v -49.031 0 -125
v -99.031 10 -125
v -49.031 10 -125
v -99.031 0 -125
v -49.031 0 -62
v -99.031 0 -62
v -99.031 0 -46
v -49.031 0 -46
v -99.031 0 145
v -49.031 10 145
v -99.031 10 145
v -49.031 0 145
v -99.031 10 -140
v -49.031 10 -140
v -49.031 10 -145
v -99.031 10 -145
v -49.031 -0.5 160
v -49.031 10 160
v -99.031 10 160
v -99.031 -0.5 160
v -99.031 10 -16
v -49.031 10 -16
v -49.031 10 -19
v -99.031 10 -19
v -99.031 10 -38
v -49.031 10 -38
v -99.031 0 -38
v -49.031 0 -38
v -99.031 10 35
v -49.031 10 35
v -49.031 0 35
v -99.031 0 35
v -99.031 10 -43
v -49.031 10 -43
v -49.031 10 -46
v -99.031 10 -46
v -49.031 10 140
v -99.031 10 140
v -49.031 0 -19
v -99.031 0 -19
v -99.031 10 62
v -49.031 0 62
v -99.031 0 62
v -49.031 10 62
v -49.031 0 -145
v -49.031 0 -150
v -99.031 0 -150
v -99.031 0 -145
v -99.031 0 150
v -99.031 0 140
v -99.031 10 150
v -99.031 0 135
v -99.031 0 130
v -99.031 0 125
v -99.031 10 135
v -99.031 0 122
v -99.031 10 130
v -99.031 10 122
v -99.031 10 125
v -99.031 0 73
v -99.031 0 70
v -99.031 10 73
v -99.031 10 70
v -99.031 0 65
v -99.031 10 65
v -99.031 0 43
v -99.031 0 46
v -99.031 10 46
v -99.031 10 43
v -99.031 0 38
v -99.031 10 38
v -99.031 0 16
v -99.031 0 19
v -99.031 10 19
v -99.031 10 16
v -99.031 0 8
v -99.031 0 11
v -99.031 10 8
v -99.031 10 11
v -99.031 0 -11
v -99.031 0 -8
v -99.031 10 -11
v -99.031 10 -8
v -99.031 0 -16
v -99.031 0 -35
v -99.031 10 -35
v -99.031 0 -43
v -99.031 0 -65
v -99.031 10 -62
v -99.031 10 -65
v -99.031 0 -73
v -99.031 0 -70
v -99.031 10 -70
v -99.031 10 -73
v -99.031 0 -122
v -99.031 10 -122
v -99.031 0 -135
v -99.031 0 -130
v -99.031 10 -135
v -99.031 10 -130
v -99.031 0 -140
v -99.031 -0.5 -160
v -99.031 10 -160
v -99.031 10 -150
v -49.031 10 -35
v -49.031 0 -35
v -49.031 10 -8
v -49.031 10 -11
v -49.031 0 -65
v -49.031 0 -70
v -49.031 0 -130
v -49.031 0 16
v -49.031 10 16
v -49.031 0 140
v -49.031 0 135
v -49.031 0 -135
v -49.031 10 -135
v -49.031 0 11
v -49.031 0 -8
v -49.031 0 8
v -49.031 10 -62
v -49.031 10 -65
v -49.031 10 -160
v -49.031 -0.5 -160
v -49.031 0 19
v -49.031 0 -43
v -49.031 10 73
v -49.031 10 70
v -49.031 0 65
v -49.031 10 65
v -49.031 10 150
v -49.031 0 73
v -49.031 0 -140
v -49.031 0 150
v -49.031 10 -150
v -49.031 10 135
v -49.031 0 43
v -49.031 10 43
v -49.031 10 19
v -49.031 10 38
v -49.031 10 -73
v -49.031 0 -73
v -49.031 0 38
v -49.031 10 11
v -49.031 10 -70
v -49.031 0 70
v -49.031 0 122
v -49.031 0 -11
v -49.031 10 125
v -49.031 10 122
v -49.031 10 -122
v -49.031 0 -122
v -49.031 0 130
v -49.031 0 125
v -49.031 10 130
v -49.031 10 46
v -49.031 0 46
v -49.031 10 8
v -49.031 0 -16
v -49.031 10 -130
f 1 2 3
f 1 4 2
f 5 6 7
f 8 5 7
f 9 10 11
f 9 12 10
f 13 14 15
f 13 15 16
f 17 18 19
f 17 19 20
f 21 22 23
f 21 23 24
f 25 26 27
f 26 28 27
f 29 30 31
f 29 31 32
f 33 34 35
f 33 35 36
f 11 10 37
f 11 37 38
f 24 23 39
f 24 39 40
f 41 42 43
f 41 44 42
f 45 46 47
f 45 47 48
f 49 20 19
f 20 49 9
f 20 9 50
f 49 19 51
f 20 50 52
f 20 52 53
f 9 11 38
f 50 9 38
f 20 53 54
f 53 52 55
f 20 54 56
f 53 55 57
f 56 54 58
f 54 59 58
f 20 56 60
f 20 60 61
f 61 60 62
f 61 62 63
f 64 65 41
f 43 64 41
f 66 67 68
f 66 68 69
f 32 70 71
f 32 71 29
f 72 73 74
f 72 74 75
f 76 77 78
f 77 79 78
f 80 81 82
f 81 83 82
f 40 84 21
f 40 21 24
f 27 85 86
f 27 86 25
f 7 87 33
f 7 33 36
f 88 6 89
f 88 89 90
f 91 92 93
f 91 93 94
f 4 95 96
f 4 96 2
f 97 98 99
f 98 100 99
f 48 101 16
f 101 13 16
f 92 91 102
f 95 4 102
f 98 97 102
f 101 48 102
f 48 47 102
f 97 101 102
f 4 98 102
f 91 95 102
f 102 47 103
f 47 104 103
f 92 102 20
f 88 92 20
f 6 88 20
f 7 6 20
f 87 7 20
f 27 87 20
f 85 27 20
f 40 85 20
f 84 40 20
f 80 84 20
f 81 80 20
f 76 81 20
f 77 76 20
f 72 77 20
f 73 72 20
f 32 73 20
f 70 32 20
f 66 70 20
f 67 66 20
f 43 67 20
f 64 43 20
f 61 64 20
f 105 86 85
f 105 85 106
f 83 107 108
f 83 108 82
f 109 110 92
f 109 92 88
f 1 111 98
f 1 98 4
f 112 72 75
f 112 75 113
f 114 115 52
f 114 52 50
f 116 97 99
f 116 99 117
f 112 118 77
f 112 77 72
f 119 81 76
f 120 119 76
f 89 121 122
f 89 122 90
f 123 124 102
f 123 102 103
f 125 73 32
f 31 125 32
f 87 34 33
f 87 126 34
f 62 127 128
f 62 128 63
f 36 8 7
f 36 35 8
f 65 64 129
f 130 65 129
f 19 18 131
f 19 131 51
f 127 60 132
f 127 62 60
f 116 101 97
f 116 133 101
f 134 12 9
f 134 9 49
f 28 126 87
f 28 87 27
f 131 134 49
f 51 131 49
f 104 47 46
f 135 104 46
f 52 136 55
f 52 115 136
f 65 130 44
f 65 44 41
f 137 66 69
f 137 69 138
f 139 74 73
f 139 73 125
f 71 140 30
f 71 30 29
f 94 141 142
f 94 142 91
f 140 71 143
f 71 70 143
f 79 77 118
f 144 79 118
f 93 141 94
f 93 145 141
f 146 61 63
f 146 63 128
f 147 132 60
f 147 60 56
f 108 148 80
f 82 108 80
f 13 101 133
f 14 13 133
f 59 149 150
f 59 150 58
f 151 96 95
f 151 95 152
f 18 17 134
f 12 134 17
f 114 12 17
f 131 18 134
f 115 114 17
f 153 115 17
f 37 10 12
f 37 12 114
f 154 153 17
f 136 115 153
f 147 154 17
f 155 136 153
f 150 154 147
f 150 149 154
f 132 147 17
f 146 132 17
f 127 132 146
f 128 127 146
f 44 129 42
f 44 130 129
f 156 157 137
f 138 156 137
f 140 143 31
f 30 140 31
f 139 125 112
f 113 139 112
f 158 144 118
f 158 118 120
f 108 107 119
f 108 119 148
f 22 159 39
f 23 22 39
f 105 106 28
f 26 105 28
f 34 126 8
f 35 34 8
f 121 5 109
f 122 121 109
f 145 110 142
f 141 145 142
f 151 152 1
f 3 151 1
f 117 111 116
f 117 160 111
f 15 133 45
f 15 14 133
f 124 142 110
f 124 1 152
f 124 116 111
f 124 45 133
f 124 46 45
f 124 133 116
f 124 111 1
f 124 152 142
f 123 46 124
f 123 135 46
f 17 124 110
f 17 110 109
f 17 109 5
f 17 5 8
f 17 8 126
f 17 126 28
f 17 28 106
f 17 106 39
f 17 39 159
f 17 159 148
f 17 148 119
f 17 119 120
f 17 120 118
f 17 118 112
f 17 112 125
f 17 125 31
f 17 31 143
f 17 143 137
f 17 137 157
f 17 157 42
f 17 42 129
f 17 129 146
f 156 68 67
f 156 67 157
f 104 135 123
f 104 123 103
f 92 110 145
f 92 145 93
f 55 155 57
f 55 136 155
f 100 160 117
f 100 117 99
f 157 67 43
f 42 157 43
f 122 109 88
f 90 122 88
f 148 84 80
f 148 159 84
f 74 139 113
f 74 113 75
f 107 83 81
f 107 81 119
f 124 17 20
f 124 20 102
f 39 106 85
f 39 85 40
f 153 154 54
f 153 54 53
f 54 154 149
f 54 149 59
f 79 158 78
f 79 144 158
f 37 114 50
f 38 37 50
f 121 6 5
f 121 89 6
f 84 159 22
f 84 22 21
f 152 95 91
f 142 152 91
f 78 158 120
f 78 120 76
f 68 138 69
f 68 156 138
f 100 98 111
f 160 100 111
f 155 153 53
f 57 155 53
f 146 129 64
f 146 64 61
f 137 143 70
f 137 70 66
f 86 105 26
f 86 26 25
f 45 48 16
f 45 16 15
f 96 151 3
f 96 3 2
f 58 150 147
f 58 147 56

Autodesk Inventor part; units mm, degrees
ref_plane "YZ Plane" through (0, 0, 0) normal (1, 0, 0) x (0, 1, 0)
ref_plane "XZ Plane" through (0, 0, 0) normal (0, 1, 0) x (-1, 0, 0)
ref_plane "XY Plane" through (0, 0, 0) normal (0, 0, 1) x (1, 0, 0)
sketch "Sketch1" plane through (0, 0, 0) normal (0, 1, 0) x (-1, 0, 0)
  line L0 (49.0311, 150) -> (99.0311, 150)
  line L1 (49.0311, 145) -> (99.0311, 145)
  line L2 (99.0311, 16) -> (49.0311, 16)
  line L3 (99.0311, 11) -> (49.0311, 11)
  line L4 (49.0311, 135) -> (99.0311, 135)
  line L5 (49.0311, 140) -> (99.0311, 140)
  line L6 (99.0311, 43) -> (49.0311, 43)
  line L7 (99.0311, 38) -> (49.0311, 38)
  line L8 (49.0311, 125) -> (99.0311, 125)
  line L9 (99.0311, 70) -> (49.0311, 70)
  line L10 (49.0311, 130) -> (99.0311, 130)
  line L11 (99.0311, 65) -> (49.0311, 65)
  line L12 (49.0311, -11) -> (99.0311, -11)
  line L13 (99.0311, -150) -> (49.0311, -150)
  line L14 (49.0311, -16) -> (99.0311, -16)
  line L15 (99.0311, -145) -> (49.0311, -145)
  line L16 (49.0311, -38) -> (99.0311, -38)
  line L17 (99.0311, -140) -> (49.0311, -140)
  line L18 (49.0311, -43) -> (99.0311, -43)
  line L19 (99.0311, -135) -> (49.0311, -135)
  line L20 (49.0311, -65) -> (99.0311, -65)
  line L21 (49.0311, -70) -> (99.0311, -70)
  line L22 (99.0311, -125) -> (49.0311, -125)
  line L23 (99.0311, -130) -> (49.0311, -130)
  line L24 (99.0311, -160) -> (49.0311, -160)
  line L25 (49.0311, 160) -> (99.0311, 160)
  line L26 (99.0311, -231.4683) -> (49.0311, -231.4683) construction
  line L27 (49.0311, -231.4683) -> (49.0311, 236.8413) construction
  line L28 (49.0311, 236.8413) -> (99.0311, 236.8413) construction
  line L29 (99.0311, 236.8413) -> (99.0311, -231.4683) construction
  line L30 (99.0311, -160) -> (49.0311, -160)
  line L31 (49.0311, -160) -> (49.0311, 160)
  line L32 (49.0311, 160) -> (99.0311, 160)
  line L33 (99.0311, 160) -> (99.0311, -160)
  point P0 (-18.4221, 150)
  dimension "d3" = 5
  dimension "d5" = 5
  dimension "d7" = 5
  dimension "d9" = 5
  dimension "d14" = 5
  dimension "d16" = 5
  dimension "d18" = 5
  dimension "d20" = 22
  dimension "d22" = 5
  dimension "d30" = 5
  dimension "d32" = 5
  dimension "d38" = 5
  dimension "d40" = 5
  dimension "d43" = 5
  dimension "d48" = 5
  dimension "d49" = 5
  dimension "d56" = 10
  dimension "d58" = 10
  dimension "d63" = 50
extrude "Extrusion1" add sketch "Sketch1" along normal blind 10 contours L31 L25 L33 L0 | L1 L33 L5 L31 | L4 L33 L10 L31 | L8 L33 L9 L31 | L11 L33 L6 L31 | L7 L33 L2 L31 | L3 L33 L12 L31 | L14 L33 L16 L31 | L18 L33 L20 L31 | L21 L33 L22 L31 | L23 L33 L19 L31 | L17 L33 L15 L31 | L13 L33 L24 L31
sketch "Sketch2" plane through (0, 10, 0) normal (0, 1, 0) x (1, 0, 0)
  line L0 (-99.0311, 125) -> (-99.0311, 70) projected
  line L1 (-49.0311, 70) -> (-49.0311, 125) projected
  line L2 (-99.0311, 122) -> (-49.0311, 122)
  line L3 (-49.0311, 122) -> (-49.0311, 73)
  line L4 (-49.0311, 73) -> (-99.0311, 73)
  line L5 (-99.0311, 73) -> (-99.0311, 122)
  line L6 (-49.0311, 125) -> (-99.0311, 125) projected
  line L7 (-99.0311, 70) -> (-49.0311, 70) projected
  line L8 (-99.0311, 65) -> (-99.0311, 43) projected
  line L9 (-99.0311, 62) -> (-49.0311, 62)
  line L10 (-49.0311, 62) -> (-49.0311, 46)
  line L11 (-49.0311, 46) -> (-99.0311, 46)
  line L12 (-99.0311, 46) -> (-99.0311, 62)
  line L13 (-99.0311, 35) -> (-49.0311, 35)
  line L14 (-49.0311, 35) -> (-49.0311, 19)
  line L15 (-49.0311, 19) -> (-99.0311, 19)
  line L16 (-99.0311, 19) -> (-99.0311, 35)
  line L17 (-49.0311, -11) -> (-49.0311, 11) projected
  line L18 (-99.0311, 8) -> (-49.0311, 8)
  line L19 (-49.0311, 8) -> (-49.0311, -8)
  line L20 (-49.0311, -8) -> (-99.0311, -8)
  line L21 (-99.0311, -8) -> (-99.0311, 8)
  line L22 (-99.0311, -19) -> (-49.0311, -19)
  line L23 (-49.0311, -19) -> (-49.0311, -35)
  line L24 (-49.0311, -35) -> (-99.0311, -35)
  line L25 (-99.0311, -35) -> (-99.0311, -19)
  line L26 (-99.0311, -43) -> (-99.0311, -65) projected
  line L27 (-49.0311, -65) -> (-49.0311, -43) projected
  line L28 (-99.0311, -46) -> (-49.0311, -46)
  line L29 (-49.0311, -46) -> (-49.0311, -62)
  line L30 (-49.0311, -62) -> (-99.0311, -62)
  line L31 (-99.0311, -62) -> (-99.0311, -46)
  line L32 (-49.0311, -125) -> (-49.0311, -70) projected
  line L33 (-99.0311, -73) -> (-49.0311, -73)
  line L34 (-49.0311, -73) -> (-49.0311, -122)
  line L35 (-49.0311, -122) -> (-99.0311, -122)
  line L36 (-99.0311, -122) -> (-99.0311, -73)
  line L37 (-49.0311, 65) -> (-99.0311, 65) projected
  line L38 (-99.0311, 43) -> (-49.0311, 43) projected
  line L39 (-49.0311, 38) -> (-99.0311, 38) projected
  line L40 (-99.0311, 16) -> (-49.0311, 16) projected
  line L41 (-49.0311, 11) -> (-99.0311, 11) projected
  line L42 (-99.0311, -11) -> (-49.0311, -11) projected
  line L43 (-49.0311, -16) -> (-99.0311, -16) projected
  line L44 (-99.0311, -38) -> (-49.0311, -38) projected
  line L45 (-49.0311, -43) -> (-99.0311, -43) projected
  line L46 (-99.0311, -65) -> (-49.0311, -65) projected
  line L47 (-49.0311, -70) -> (-99.0311, -70) projected
  line L48 (-99.0311, -125) -> (-49.0311, -125) projected
  point P0 (0, 0)
  dimension "d66" = 3
  dimension "d67" = 3
  dimension "d68" = 3
  dimension "d69" = 3
  dimension "d70" = 3
  dimension "d71" = 3
  dimension "d72" = 3
  dimension "d73" = 3
  dimension "d74" = 3
  dimension "d75" = 3
  dimension "d76" = 3
  dimension "d77" = 3
  dimension "d78" = 3
  dimension "d79" = 3
extrude "Extrusion2" cut sketch "Sketch2" against normal blind 10 contours L2 L1 L4 L0 | L9 L10 L11 L8 | L13 L14 L15 L16 | L20 L21 L18 L17 | L22 L23 L24 L25 | L28 L27 L30 L26 | L35 L36 L33 L32
sketch "Sketch3" plane through (-49.0311, 0, -150) normal (1, 0, 0) x (0, 0, -1)
  line L0 (10, 0) -> (10, 10) projected
  line L1 (10, 0) -> (-310, 0)
  line L2 (-310, 0) -> (-310, -0.5)
  line L3 (-310, -0.5) -> (10, -0.5)
  line L4 (10, -0.5) -> (10, 0)
  point P0 (-150, 0)
  dimension "d82" = 0.5
extrude "Extrusion3" add sketch "Sketch3" against normal blind 50
equation "\"d3\" = d25"
equation "\"d5\" = d26"
equation "\"d7\" = d25"
equation "\"d9\" = d25"
equation "\"d14\" = d25"
equation "\"d16\" = d26"
equation "\"d18\" = d25"
equation "\"d20\" = d28"
equation "\"d22\" = d25"
equation "\"d30\" = d51"
equation "\"d32\" = d51"
equation "\"d38\" = d51"
equation "\"d40\" = d51"
equation "\"d43\" = d51"
equation "\"d48\" = d51"
equation "\"d49\" = d53"
equation "\"d25\" = 5"
equation "\"d26\" = 5"
equation "\"d28\" = -1.2 * d25 + 0.2 * d29"
equation "\"d51\" = 5"
equation "\"d53\" = 5"
equation "\"d54\" = -1.2 * d51 + 0.2 * d55"
equation "\"d29\" = 140"
equation "\"d55\" = 140"
properties part number "wire_holder_middle"
